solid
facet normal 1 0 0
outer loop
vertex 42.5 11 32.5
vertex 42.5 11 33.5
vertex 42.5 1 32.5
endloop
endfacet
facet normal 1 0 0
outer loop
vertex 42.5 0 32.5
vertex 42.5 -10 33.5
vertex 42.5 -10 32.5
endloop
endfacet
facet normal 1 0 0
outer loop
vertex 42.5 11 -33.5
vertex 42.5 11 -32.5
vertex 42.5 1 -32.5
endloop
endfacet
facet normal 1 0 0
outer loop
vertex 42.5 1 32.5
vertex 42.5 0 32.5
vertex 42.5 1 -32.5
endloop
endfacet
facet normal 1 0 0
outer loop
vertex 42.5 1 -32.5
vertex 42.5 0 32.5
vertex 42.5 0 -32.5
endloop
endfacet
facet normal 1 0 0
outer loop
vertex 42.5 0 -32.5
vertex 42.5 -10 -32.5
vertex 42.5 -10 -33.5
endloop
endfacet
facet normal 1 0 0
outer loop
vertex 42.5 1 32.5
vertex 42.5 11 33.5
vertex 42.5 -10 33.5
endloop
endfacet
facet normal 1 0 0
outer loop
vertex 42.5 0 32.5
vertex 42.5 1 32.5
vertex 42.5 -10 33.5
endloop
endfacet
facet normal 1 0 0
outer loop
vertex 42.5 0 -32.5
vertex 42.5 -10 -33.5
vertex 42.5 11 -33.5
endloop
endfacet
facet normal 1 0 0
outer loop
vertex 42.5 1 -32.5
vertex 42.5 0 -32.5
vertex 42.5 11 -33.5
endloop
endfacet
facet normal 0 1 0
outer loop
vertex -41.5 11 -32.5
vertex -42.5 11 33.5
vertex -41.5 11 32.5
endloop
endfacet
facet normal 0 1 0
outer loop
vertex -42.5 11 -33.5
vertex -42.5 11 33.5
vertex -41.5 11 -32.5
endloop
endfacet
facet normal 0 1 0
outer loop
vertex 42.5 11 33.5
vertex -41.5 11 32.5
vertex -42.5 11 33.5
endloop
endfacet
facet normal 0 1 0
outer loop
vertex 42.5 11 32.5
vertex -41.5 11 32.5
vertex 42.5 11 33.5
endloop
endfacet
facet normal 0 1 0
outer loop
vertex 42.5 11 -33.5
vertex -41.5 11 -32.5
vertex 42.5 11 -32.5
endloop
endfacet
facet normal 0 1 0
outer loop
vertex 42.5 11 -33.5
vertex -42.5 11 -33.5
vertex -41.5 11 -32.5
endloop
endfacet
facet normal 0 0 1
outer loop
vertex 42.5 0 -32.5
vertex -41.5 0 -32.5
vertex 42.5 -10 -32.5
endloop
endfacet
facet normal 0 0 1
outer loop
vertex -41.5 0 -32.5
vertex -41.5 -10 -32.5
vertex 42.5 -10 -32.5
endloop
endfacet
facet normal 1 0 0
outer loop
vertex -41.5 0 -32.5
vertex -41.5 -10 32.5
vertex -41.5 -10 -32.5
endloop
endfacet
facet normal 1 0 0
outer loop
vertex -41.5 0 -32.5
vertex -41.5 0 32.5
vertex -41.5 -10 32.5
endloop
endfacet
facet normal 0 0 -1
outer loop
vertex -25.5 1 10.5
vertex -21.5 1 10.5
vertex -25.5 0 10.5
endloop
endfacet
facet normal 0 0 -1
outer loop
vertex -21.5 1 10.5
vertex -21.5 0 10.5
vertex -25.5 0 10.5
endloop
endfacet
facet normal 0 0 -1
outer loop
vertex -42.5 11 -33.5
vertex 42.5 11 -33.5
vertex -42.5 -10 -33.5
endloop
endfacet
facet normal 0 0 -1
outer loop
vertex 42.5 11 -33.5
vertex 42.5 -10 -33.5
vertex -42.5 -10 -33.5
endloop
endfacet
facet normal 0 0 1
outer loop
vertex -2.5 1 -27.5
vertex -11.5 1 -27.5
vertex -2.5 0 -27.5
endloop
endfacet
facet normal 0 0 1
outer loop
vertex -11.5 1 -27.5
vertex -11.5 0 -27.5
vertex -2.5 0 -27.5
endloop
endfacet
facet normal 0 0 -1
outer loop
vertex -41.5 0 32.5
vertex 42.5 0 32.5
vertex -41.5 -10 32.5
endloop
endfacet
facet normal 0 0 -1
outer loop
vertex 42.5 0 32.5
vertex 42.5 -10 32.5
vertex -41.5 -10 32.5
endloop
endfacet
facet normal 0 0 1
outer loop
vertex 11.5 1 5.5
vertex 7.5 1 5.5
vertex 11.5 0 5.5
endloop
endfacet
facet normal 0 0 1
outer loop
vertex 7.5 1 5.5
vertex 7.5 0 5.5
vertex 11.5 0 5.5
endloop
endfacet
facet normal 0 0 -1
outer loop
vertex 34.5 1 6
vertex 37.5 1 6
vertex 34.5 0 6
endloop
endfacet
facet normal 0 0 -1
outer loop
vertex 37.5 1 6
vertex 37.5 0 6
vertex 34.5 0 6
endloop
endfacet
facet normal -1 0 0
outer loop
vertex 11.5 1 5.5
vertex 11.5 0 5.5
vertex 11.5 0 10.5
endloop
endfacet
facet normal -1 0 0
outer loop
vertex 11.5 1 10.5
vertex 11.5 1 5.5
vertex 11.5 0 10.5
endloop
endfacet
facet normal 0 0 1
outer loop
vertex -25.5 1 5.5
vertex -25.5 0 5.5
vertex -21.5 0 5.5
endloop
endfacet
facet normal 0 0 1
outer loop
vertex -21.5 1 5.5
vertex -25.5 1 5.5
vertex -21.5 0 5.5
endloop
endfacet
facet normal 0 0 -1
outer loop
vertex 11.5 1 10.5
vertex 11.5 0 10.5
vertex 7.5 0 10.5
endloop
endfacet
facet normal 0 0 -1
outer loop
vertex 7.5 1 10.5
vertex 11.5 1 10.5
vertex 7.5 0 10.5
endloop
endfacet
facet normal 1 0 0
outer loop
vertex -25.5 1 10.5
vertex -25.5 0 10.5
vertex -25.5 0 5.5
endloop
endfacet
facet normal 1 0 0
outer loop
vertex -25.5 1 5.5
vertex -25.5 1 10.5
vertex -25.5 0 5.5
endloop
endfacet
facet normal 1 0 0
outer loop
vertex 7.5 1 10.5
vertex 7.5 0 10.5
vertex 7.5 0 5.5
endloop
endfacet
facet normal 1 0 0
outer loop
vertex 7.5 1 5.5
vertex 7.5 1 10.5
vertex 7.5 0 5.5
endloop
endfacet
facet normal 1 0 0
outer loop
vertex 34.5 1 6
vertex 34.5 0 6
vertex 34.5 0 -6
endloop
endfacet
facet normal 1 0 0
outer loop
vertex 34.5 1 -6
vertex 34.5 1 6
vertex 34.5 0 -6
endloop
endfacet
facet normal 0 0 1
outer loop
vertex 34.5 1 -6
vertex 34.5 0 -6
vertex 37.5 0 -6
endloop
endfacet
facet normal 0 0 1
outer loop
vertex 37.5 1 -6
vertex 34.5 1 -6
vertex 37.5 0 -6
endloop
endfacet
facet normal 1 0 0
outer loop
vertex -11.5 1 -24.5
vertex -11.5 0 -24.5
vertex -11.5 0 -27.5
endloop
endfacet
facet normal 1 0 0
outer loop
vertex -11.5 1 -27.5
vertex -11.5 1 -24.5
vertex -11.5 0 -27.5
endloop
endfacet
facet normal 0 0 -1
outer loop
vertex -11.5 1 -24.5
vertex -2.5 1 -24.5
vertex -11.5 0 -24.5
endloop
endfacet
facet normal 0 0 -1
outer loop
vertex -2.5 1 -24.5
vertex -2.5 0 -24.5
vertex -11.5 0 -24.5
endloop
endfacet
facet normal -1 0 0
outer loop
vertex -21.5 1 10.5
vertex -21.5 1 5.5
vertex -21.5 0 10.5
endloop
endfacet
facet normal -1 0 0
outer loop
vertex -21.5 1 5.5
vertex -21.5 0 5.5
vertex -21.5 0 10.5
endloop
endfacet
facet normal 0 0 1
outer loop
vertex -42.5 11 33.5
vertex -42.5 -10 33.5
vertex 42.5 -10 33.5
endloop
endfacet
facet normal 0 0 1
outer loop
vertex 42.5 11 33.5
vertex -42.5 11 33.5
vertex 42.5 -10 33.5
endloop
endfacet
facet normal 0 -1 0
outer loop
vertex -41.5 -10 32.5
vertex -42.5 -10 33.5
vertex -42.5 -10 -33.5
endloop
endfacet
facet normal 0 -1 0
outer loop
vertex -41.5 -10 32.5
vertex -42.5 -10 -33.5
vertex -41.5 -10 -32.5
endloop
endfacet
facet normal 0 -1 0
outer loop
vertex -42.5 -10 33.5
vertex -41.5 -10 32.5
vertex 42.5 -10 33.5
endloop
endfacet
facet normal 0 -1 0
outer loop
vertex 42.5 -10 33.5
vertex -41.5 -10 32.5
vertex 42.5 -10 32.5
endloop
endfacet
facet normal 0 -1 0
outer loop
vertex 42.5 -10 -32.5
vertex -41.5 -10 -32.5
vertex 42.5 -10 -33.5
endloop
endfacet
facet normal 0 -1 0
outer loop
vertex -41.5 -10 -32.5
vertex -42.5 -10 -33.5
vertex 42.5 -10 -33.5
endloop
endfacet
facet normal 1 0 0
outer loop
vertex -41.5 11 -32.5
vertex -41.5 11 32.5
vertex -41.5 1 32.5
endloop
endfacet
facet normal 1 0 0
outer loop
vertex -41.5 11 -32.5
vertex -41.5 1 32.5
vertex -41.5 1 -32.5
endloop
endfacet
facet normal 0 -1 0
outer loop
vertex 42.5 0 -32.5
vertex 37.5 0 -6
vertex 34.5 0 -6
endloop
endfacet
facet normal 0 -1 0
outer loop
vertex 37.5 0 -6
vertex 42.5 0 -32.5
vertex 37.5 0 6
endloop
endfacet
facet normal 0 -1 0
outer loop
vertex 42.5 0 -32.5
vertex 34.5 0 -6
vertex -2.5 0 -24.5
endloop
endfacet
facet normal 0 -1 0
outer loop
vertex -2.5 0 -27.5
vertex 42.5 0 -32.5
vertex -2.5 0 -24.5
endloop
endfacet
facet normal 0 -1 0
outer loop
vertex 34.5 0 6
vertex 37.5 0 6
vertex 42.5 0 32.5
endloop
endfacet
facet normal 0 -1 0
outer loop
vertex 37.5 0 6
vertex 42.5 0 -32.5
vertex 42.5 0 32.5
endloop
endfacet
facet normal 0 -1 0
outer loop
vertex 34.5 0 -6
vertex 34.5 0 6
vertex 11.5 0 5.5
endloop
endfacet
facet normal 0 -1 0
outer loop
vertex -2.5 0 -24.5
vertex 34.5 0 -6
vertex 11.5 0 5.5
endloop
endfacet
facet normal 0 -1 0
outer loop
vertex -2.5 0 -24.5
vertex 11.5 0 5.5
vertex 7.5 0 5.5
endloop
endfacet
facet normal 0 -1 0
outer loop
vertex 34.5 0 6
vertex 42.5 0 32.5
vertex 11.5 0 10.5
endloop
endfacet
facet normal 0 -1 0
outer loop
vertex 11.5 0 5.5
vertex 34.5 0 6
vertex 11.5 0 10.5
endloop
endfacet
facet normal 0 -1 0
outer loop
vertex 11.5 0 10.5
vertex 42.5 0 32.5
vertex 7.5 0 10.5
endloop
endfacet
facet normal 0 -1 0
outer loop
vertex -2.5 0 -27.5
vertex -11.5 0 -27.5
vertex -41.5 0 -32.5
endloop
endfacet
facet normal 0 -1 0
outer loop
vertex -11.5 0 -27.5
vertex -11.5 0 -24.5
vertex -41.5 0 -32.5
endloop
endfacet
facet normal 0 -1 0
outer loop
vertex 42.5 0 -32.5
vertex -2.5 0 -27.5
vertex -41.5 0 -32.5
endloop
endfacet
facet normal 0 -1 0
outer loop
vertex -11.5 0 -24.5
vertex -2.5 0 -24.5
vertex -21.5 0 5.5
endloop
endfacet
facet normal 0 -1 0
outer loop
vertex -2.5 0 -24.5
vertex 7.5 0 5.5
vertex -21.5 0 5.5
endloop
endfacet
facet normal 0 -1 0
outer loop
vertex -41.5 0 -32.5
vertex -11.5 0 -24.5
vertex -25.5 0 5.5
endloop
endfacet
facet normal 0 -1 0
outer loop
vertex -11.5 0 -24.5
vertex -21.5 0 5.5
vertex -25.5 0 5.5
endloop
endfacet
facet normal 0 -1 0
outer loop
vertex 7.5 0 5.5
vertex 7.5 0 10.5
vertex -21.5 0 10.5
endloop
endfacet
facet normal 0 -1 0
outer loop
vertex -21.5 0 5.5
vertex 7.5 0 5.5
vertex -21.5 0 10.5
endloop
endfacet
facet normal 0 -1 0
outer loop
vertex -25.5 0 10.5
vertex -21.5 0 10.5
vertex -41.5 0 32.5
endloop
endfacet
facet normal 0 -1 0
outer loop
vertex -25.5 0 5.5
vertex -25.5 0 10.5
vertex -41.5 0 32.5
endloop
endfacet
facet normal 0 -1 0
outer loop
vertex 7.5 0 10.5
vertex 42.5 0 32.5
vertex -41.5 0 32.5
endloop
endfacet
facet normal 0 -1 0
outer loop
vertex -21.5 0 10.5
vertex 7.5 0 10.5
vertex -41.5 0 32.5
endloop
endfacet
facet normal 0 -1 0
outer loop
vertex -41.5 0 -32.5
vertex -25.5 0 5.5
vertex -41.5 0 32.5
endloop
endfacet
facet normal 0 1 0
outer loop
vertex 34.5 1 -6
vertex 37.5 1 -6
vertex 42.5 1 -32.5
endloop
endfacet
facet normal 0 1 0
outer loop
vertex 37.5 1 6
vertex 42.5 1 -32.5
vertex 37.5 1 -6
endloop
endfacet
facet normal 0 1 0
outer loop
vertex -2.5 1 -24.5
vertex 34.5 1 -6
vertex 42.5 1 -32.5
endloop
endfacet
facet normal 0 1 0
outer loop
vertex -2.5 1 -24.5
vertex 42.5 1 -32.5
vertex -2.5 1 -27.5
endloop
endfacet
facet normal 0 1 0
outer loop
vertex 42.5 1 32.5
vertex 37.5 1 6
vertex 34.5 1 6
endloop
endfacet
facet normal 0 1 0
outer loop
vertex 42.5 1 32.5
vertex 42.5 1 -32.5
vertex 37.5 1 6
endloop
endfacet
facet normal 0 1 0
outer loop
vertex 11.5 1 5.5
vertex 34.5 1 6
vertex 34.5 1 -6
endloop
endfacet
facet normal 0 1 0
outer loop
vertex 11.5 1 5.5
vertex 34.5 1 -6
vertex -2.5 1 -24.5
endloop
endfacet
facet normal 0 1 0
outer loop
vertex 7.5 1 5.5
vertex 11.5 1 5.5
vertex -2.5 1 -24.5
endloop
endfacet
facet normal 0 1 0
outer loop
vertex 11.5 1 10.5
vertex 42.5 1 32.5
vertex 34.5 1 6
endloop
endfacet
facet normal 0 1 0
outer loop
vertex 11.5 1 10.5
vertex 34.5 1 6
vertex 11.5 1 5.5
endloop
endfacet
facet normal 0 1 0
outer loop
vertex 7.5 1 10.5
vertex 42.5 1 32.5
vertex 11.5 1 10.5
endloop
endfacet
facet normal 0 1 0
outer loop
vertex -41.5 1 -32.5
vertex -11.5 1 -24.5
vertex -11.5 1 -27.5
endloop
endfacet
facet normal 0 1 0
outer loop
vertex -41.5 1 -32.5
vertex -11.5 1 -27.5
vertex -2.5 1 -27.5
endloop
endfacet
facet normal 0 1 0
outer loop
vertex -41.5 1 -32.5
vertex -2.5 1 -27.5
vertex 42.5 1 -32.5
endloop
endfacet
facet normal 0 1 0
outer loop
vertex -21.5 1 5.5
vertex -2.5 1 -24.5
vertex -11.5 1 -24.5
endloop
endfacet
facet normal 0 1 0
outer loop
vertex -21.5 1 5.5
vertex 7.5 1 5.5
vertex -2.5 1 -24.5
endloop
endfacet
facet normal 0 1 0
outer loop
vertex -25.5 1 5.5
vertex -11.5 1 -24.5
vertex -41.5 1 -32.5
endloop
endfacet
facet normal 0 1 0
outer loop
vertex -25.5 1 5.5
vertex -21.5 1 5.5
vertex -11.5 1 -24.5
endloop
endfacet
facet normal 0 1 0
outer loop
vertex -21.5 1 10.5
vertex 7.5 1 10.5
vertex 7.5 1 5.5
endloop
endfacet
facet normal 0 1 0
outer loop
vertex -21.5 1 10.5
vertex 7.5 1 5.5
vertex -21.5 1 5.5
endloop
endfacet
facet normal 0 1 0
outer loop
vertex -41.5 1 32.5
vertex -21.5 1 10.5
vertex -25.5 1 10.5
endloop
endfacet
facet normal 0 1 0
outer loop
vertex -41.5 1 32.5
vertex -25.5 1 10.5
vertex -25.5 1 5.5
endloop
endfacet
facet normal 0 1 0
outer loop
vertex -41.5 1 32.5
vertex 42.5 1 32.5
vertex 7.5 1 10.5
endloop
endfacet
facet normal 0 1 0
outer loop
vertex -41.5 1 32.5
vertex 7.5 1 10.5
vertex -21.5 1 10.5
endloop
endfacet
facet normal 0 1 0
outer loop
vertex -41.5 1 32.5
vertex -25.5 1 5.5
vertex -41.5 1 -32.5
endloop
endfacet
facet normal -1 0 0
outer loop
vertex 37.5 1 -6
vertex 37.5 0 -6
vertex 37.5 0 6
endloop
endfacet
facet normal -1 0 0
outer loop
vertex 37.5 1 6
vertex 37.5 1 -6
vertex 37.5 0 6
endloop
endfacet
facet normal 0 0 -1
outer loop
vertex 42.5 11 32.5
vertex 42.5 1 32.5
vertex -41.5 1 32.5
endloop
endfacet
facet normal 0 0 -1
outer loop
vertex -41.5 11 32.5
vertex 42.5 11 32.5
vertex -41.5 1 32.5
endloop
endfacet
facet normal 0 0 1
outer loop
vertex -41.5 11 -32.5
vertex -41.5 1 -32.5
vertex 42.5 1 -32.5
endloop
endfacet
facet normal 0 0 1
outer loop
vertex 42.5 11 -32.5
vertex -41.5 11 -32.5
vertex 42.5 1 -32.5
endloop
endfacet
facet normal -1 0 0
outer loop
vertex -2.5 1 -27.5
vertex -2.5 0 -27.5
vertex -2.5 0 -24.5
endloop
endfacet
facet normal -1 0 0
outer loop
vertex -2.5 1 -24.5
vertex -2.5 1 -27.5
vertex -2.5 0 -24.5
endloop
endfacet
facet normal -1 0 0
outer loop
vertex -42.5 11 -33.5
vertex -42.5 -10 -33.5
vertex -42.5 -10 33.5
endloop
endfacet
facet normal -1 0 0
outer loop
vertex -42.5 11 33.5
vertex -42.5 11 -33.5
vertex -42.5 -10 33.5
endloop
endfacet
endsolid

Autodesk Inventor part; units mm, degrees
ref_plane "YZ Plane" through (0, 0, 0) normal (1, 0, 0) x (0, 1, 0)
ref_plane "XZ Plane" through (0, 0, 0) normal (0, 1, 0) x (-1, 0, 0)
ref_plane "XY Plane" through (0, 0, 0) normal (0, 0, 1) x (1, 0, 0)
sketch "Sketch1" plane through (0, 0, 0) normal (0, 1, 0) x (-1, 0, 0)
  line L0 (42.5, 33.5) -> (-42.5, 33.5)
  line L1 (-42.5, 33.5) -> (-42.5, -33.5)
  line L2 (-42.5, -33.5) -> (42.5, -33.5)
  line L3 (42.5, -33.5) -> (42.5, 33.5)
  point P0 (0, 0)
  point P1 (42.5, 0)
  point P2 (0, 33.5)
  dimension "d0" = 67
  dimension "d1" = 85
extrude "Extrusion1" add sketch "Sketch1" along normal blind 1
sketch "Sketch2" plane through (0, 1, 0) normal (0, 1, 0) x (1, 0, 0)
  line L0 (-42.5, 33.5) -> (-42.5, -33.5) projected
  line L1 (42.5, -33.5) -> (42.5, 33.5) projected
  line L2 (-42.5, -33.5) -> (42.5, -33.5)
  line L3 (42.5, -33.5) -> (42.5, -32.5)
  line L4 (42.5, -32.5) -> (-42.5, -32.5)
  line L5 (-42.5, -32.5) -> (-42.5, -33.5)
  line L6 (-42.5, 32.5) -> (42.5, 32.5)
  line L7 (42.5, 32.5) -> (42.5, 33.5)
  line L8 (42.5, 33.5) -> (-42.5, 33.5)
  line L9 (-42.5, 33.5) -> (-42.5, 32.5)
  point P0 (0, 0)
  dimension "d4" = 1
  dimension "d5" = 1
extrude "Extrusion2" add sketch "Sketch2" along normal blind 10 and the other way blind 11 contours L8 L1 L6 L0 | L4 L1 L2 L0
sketch "Sketch3" plane through (0, 0, 0) normal (0, -1, 0) x (1, 0, 0)
  line L0 (-42.5, -32.5) -> (-42.5, 32.5) projected
  line L1 (-42.5, -32.5) -> (42.5, -32.5) projected
  line L2 (-42.5, 32.5) -> (-41.5, 32.5)
  line L3 (-41.5, 32.5) -> (-41.5, -32.5)
  line L4 (-41.5, -32.5) -> (-42.5, -32.5)
  line L5 (-42.5, -32.5) -> (-42.5, 32.5)
  point P0 (0, 0)
  dimension "d10" = 1
extrude "Extrusion3" add sketch "Sketch3" along normal blind 10 and the other way blind 11
sketch "Sketch4" plane through (0, 0, 0) normal (0, -1, 0) x (1, 0, 0)
  line L0 (-2.5, -24.5) -> (-11.5, -24.5)
  line L1 (-11.5, -24.5) -> (-11.5, -27.5)
  line L2 (-11.5, -27.5) -> (-2.5, -27.5)
  line L3 (-2.5, -27.5) -> (-2.5, -24.5)
  line L4 (42.5, -32.5) -> (-41.5, -32.5) projected
  line L5 (-41.5, -32.5) -> (-41.5, 32.5) projected
  line L6 (37.5, 6) -> (34.5, 6)
  line L7 (34.5, 6) -> (34.5, -6)
  line L8 (34.5, -6) -> (37.5, -6)
  line L9 (37.5, -6) -> (37.5, 6)
  line L10 (42.5, 32.5) -> (42.5, -32.5) projected
  line L11 (11.5, 10.5) -> (7.5, 10.5)
  line L12 (7.5, 10.5) -> (7.5, 5.5)
  line L13 (7.5, 5.5) -> (11.5, 5.5)
  line L14 (11.5, 5.5) -> (11.5, 10.5)
  line L15 (-21.5, 10.5) -> (-25.5, 10.5)
  line L16 (-25.5, 10.5) -> (-25.5, 5.5)
  line L17 (-25.5, 5.5) -> (-21.5, 5.5)
  line L18 (-21.5, 5.5) -> (-21.5, 10.5)
  point P0 (0, 0)
  point P1 (37.5, 0)
  dimension "d13" = 9
  dimension "d14" = 3
  dimension "d15" = 5
  dimension "d16" = 30
  dimension "d17" = 12
  dimension "d18" = 3
  dimension "d19" = 5
  dimension "d24" = 5
  dimension "d25" = 4
  dimension "d26" = 5
  dimension "d27" = 4
  dimension "d28" = 10
  dimension "d29" = 10
  dimension "d30" = 30
  dimension "d31" = 30
extrude "Extrusion4" cut sketch "Sketch4" against normal blind 10
properties part number "Thermometer Cover"
